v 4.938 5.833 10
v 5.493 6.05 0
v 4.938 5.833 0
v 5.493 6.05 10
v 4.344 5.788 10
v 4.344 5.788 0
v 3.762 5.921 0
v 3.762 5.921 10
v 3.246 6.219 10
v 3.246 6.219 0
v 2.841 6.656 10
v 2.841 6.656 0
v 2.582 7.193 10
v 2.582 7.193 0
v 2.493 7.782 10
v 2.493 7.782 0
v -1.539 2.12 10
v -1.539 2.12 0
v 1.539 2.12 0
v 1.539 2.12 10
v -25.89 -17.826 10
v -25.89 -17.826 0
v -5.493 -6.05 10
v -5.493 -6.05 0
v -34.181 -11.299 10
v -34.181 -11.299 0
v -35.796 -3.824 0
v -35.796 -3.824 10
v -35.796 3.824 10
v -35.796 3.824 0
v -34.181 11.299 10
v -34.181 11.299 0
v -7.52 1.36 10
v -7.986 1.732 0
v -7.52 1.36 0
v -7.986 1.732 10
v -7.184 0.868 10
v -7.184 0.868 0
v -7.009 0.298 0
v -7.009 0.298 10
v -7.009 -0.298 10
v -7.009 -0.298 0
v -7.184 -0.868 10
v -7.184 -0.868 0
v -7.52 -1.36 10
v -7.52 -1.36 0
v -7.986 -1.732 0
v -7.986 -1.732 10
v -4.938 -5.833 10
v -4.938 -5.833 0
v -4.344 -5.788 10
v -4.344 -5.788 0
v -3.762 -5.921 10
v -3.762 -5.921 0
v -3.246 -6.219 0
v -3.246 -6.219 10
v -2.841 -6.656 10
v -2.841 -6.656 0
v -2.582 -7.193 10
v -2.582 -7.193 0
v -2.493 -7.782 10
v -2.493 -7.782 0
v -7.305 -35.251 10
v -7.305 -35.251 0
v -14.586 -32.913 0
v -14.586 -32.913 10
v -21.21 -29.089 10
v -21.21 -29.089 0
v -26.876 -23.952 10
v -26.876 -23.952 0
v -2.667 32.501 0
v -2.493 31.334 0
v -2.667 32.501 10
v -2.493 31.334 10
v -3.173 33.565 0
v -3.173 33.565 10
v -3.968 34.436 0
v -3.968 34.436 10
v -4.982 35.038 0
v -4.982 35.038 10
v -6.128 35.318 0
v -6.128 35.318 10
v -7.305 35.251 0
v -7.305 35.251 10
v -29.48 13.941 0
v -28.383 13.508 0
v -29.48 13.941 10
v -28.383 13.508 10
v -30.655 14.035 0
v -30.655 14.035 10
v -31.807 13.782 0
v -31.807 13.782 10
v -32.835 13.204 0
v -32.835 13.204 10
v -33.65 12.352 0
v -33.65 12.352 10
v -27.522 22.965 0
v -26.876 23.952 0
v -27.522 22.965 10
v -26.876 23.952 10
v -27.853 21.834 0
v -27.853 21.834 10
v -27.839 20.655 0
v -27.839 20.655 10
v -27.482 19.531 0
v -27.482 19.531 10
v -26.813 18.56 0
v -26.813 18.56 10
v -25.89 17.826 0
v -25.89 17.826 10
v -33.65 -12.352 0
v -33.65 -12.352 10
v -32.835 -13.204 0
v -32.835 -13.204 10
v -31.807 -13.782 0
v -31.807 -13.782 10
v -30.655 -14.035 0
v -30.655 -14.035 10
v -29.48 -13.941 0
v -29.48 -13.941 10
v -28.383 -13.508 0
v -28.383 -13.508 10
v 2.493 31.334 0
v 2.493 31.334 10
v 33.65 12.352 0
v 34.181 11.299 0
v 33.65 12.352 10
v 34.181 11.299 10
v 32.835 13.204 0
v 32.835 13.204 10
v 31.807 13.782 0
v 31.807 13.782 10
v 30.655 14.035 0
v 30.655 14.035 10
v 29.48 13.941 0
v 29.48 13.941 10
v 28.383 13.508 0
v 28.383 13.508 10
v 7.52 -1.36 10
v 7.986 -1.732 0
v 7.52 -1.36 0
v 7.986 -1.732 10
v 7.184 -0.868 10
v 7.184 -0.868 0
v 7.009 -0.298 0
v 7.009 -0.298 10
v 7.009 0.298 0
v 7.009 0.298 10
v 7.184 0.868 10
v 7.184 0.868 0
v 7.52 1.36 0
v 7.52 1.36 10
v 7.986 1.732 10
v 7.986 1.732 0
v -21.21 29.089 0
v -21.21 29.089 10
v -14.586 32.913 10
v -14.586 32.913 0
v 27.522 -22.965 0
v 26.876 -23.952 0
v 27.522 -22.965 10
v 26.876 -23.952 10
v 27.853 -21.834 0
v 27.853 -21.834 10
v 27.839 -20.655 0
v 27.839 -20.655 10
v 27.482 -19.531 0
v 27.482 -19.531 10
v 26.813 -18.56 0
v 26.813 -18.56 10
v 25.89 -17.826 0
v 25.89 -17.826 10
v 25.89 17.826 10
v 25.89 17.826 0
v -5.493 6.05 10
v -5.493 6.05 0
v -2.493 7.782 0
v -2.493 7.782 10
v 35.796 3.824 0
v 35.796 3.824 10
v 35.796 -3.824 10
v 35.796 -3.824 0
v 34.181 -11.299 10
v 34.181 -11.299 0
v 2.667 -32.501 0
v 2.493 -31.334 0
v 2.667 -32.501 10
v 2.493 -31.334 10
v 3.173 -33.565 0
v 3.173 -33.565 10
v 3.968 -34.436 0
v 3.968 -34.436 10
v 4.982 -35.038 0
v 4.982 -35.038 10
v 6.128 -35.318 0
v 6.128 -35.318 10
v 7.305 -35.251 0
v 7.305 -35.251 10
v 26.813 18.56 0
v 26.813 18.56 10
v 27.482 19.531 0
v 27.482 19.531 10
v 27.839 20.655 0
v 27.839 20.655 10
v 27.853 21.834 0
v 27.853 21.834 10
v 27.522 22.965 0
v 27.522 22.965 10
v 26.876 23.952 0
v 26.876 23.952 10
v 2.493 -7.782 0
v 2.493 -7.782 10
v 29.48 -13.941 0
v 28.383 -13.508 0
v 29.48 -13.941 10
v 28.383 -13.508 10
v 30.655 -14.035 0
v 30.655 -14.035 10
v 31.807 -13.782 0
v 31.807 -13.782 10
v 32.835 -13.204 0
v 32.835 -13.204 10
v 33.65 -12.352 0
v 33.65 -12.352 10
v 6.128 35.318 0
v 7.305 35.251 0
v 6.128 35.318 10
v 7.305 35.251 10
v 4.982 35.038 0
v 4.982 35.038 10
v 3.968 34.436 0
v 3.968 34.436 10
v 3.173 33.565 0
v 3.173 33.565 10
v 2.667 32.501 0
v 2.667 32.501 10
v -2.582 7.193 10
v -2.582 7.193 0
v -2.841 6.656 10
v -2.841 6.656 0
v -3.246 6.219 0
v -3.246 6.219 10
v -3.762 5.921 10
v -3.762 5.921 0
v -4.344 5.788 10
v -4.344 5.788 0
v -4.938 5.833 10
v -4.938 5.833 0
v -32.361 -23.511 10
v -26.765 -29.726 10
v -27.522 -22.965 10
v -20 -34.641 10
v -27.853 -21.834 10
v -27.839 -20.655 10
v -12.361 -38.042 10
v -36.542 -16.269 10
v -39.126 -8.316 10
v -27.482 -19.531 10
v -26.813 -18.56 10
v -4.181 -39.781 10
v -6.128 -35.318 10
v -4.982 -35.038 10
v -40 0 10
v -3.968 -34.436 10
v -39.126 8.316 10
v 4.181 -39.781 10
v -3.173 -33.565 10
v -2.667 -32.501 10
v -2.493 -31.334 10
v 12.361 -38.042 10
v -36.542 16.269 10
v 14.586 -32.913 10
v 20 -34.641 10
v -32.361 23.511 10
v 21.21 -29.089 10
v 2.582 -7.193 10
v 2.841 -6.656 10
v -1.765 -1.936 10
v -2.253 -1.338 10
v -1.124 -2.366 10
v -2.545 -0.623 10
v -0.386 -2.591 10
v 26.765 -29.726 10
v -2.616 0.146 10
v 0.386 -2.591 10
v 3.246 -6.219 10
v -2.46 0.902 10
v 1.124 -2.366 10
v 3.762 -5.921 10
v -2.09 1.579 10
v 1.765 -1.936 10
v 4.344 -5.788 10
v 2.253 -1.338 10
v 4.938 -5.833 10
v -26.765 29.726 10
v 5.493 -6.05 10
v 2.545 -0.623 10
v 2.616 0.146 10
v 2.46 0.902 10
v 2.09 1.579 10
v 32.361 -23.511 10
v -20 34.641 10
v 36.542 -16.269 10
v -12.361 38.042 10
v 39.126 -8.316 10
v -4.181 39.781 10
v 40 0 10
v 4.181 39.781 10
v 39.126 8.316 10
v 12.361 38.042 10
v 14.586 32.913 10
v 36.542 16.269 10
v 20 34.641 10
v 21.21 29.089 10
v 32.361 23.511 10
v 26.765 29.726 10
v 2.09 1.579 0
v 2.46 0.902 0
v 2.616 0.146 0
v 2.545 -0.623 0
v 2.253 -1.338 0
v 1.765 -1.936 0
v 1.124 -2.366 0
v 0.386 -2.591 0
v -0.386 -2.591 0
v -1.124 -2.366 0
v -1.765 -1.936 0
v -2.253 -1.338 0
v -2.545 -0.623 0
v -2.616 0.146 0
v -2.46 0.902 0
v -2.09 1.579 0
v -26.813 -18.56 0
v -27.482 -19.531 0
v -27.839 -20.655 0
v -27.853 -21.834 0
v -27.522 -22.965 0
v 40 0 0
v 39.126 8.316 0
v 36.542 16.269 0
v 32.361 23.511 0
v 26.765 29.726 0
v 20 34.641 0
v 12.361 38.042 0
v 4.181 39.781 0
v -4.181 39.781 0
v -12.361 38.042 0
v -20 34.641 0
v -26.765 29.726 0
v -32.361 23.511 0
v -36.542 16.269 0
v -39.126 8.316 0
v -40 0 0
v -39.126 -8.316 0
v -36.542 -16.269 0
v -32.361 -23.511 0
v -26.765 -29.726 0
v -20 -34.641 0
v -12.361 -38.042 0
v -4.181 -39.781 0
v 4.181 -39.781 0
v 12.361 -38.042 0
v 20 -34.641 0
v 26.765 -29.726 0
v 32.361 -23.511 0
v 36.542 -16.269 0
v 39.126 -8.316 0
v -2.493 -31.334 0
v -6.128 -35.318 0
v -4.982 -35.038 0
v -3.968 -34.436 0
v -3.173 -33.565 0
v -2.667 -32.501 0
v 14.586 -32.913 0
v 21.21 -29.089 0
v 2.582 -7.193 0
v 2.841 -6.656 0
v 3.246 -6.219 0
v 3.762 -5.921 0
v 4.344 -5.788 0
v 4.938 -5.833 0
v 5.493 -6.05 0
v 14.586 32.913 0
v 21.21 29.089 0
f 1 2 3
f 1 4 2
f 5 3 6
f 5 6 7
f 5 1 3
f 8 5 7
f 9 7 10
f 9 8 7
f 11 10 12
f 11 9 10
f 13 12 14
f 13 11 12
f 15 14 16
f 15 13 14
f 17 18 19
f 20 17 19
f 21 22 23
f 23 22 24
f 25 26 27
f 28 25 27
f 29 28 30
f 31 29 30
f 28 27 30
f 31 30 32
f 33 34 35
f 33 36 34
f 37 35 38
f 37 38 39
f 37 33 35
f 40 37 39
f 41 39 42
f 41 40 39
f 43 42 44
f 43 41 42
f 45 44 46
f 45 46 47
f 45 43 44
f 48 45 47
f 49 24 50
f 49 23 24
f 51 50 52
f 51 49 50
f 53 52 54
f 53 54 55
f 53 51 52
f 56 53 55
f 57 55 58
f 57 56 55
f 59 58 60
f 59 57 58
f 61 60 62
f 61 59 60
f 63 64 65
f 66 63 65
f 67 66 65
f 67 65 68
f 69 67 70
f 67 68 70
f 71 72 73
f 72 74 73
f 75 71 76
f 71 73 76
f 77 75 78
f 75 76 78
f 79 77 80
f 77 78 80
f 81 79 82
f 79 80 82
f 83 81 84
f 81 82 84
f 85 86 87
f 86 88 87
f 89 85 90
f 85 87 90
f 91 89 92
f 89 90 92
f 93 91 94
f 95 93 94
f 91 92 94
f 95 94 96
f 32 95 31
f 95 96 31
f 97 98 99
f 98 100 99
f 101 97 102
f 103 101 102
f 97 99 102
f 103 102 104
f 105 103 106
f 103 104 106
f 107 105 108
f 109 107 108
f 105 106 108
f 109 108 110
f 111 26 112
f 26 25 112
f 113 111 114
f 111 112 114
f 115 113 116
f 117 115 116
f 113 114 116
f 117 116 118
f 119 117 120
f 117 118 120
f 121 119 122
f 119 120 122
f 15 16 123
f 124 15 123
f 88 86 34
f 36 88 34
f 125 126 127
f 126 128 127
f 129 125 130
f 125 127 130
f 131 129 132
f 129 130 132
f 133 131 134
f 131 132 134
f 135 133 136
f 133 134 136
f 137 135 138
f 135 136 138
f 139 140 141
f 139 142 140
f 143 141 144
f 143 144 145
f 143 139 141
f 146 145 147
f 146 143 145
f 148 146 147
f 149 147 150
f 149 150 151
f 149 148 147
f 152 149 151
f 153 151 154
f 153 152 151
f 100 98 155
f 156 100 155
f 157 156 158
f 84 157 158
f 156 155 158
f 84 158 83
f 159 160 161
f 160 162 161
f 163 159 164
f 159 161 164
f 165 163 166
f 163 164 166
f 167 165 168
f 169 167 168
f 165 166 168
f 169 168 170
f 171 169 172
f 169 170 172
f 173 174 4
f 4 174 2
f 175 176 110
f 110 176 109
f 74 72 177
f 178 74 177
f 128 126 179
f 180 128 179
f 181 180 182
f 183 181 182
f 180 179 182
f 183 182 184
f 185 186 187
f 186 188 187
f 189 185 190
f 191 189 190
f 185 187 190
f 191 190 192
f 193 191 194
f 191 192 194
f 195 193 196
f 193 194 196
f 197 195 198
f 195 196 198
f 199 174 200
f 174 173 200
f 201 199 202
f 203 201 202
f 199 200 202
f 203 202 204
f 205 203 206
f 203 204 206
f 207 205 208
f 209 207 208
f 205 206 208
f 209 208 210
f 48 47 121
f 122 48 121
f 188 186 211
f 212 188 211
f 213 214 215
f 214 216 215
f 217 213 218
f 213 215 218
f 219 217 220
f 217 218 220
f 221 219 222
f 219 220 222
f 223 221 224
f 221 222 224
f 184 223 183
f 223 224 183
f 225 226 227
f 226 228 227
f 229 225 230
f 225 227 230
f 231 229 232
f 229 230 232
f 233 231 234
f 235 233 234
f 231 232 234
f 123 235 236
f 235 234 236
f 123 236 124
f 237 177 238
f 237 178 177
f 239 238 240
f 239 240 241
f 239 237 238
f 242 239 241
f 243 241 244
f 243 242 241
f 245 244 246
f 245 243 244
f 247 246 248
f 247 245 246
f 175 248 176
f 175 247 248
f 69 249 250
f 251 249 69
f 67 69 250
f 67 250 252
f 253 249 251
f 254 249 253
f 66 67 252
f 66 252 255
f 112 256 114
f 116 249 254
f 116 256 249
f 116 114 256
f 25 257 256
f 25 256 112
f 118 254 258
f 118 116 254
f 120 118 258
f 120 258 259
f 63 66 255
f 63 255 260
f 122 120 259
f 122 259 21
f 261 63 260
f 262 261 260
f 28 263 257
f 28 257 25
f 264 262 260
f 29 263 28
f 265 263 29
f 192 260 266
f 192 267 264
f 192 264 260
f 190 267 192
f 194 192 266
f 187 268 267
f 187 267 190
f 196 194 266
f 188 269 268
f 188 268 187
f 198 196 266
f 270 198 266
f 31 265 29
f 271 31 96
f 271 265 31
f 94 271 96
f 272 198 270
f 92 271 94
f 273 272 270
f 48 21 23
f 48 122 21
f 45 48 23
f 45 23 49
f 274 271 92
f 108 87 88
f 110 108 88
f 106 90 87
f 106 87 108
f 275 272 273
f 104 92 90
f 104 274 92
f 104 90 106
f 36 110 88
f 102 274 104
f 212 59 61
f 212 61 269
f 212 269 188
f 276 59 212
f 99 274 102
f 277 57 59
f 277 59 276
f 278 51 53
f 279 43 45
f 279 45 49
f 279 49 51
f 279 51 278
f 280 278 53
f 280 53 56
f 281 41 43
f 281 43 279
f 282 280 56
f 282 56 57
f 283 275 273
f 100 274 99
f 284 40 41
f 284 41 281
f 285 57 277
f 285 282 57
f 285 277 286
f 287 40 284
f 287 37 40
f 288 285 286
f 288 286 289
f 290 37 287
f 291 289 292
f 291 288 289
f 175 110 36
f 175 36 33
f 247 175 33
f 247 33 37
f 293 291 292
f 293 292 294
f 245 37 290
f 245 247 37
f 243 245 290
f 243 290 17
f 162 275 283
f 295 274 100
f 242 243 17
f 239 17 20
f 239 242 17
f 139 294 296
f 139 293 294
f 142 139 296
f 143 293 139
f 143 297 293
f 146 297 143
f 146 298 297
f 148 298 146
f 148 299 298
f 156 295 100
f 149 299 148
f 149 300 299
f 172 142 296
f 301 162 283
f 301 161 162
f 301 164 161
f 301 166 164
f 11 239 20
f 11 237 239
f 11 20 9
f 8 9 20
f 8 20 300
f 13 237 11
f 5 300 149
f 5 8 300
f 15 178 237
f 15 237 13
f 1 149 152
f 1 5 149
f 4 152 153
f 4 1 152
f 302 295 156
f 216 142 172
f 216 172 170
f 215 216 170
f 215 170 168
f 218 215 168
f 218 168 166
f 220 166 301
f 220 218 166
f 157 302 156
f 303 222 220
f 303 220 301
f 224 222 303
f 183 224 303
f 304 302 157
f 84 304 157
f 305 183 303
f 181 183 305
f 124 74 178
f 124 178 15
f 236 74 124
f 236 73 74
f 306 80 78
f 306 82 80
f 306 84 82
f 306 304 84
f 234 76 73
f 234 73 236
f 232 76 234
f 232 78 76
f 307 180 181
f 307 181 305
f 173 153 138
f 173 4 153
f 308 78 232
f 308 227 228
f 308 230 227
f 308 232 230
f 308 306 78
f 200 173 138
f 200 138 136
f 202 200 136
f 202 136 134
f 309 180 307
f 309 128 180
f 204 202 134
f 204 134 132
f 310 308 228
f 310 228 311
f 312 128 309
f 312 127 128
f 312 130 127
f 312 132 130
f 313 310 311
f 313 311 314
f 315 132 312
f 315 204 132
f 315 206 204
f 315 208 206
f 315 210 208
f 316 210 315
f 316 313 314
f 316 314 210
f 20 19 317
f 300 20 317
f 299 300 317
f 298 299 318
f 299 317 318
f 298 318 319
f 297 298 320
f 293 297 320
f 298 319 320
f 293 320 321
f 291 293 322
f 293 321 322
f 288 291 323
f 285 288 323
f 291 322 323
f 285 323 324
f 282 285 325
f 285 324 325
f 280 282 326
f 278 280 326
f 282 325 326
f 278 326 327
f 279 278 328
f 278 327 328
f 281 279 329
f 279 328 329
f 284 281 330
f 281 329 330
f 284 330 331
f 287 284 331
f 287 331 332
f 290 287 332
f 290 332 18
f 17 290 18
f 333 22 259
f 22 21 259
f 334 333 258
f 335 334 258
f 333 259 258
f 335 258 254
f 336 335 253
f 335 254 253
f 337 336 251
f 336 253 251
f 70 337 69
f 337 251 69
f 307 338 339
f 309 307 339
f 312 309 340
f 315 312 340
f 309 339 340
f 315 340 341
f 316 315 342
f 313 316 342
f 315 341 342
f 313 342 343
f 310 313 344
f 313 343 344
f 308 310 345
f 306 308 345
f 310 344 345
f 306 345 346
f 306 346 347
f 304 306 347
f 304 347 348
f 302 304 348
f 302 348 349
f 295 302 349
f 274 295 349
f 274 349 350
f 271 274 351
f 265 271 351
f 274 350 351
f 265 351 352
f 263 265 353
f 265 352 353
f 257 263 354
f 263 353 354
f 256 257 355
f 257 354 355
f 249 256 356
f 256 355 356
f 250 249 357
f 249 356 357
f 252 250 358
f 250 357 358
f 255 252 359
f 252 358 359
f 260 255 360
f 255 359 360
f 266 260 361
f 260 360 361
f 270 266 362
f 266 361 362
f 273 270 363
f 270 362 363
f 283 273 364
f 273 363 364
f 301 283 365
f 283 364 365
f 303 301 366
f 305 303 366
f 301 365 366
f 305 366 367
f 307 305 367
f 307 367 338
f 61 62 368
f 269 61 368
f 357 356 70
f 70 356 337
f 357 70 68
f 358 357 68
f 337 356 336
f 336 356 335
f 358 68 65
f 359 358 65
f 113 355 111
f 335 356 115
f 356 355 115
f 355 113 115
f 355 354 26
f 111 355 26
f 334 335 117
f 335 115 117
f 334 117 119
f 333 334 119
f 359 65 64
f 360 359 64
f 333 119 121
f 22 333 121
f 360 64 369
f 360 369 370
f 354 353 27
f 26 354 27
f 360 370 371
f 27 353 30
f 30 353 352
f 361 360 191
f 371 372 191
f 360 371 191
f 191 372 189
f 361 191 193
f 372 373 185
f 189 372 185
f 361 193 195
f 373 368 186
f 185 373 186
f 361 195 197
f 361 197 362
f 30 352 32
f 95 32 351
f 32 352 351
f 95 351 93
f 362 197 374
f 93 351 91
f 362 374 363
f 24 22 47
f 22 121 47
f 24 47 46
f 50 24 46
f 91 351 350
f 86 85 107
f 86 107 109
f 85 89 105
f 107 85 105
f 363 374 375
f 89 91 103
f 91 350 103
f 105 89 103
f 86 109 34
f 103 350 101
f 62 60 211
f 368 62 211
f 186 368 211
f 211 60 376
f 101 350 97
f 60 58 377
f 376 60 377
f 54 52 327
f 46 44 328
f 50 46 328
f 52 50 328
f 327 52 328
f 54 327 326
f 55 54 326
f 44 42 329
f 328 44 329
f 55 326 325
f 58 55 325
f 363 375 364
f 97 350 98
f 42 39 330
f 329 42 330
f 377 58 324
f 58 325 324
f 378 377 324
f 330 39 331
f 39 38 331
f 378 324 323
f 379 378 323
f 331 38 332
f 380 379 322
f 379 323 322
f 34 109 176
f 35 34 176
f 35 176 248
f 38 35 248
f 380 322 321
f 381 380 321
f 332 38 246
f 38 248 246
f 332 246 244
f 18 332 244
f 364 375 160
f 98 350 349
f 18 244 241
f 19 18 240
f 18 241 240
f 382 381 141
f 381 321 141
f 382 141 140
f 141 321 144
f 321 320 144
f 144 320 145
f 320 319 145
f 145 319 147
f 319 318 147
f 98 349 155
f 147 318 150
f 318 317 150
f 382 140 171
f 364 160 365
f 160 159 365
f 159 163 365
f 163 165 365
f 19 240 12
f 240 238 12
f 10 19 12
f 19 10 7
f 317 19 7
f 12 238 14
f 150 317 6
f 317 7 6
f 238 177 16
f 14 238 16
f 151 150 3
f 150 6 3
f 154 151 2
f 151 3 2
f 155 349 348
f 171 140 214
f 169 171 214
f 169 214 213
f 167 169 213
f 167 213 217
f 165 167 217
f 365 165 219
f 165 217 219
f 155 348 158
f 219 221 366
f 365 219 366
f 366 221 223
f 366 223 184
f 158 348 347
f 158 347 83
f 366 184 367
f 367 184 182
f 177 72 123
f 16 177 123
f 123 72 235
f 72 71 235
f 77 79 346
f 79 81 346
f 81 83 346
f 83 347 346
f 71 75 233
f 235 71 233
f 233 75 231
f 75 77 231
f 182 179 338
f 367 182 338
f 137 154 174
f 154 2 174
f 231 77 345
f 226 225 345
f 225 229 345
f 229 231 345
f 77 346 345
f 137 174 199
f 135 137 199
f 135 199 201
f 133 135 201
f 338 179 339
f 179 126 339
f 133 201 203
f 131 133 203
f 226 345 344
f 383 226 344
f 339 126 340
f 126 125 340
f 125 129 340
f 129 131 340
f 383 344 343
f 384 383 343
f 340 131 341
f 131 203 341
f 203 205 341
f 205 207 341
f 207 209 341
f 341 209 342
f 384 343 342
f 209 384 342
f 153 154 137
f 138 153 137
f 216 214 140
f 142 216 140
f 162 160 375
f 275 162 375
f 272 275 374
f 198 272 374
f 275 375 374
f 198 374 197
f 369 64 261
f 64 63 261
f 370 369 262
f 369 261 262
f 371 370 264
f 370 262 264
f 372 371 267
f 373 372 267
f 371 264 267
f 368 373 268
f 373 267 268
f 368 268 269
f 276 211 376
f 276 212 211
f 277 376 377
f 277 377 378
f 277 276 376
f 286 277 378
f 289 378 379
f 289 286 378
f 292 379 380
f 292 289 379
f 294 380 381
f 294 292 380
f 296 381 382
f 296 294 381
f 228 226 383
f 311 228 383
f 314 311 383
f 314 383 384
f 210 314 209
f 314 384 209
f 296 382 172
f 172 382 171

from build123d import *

# Parameters (mm, degrees)
SKETCH1_R           = 40
BOSS_EXTRUDE1_DEPTH = 10
FILLET2_R           = 2
FILLET3_R           = 4


with BuildPart() as part:
    # Sketch1 → Boss-Extrude1 (new body)
    with BuildSketch(Plane.XY):
        Circle(SKETCH1_R)
        with BuildLine():
            Line((-2.4931518, -4.318265588), (-2.4931518, -35.9135656))
            ThreePointArc((-2.4931518, -35.9135656), (-18, -31.176914536), (-29.85548425, -20.115915594))
            Line((-29.85548425, -20.115915594), (-2.4931518, -4.318265588))
        make_face(mode=Mode.SUBTRACT)
        with BuildLine():
            Line((-4.9863036, 0), (-32.34863605, -15.797650006))
            ThreePointArc((-32.34863605, -15.797650006), (-36, 0), (-32.34863605, 15.797650006))
            Line((-32.34863605, 15.797650006), (-4.9863036, 0))
        make_face(mode=Mode.SUBTRACT)
        with BuildLine():
            Line((-2.4931518, 4.318265588), (-29.85548425, 20.115915594))
            ThreePointArc((-29.85548425, 20.115915594), (-18, 31.176914536), (-2.4931518, 35.9135656))
            Line((-2.4931518, 35.9135656), (-2.4931518, 4.318265588))
        make_face(mode=Mode.SUBTRACT)
        with BuildLine():
            Line((2.4931518, 4.318265588), (2.4931518, 35.9135656))
            ThreePointArc((2.4931518, 35.9135656), (18, 31.176914536), (29.85548425, 20.115915594))
            Line((29.85548425, 20.115915594), (2.4931518, 4.318265588))
        make_face(mode=Mode.SUBTRACT)
        with BuildLine():
            Line((4.9863036, 0), (32.34863605, 15.797650006))
            ThreePointArc((32.34863605, 15.797650006), (36, 0), (32.34863605, -15.797650006))
            Line((32.34863605, -15.797650006), (4.9863036, 0))
        make_face(mode=Mode.SUBTRACT)
        with BuildLine():
            Line((2.4931518, -4.318265588), (29.85548425, -20.115915594))
            ThreePointArc((29.85548425, -20.115915594), (18, -31.176914536), (2.4931518, -35.9135656))
            Line((2.4931518, -35.9135656), (2.4931518, -4.318265588))
        make_face(mode=Mode.SUBTRACT)
        with BuildLine():
            ThreePointArc((1.539480432, 2.12), (0, -2.62), (-1.539480432, 2.12))
            Line((-1.539480432, 2.12), (1.539480432, 2.12))
        make_face(mode=Mode.SUBTRACT)
    extrude(amount=BOSS_EXTRUDE1_DEPTH)

    # Fillet2
    fillet2_edges = [part.edges().sort_by_distance(p)[0] for p in [
        (4.9863036, 0, 5),
        (2.4931518, -4.318265588, 5),
        (-2.4931518, -4.318265588, 5),
        (-4.9863036, 0, 5),
        (-2.4931518, 4.318265588, 5),
        (2.4931518, 4.318265588, 5),
    ]]
    fillet(fillet2_edges, radius=FILLET2_R)

    # Fillet3
    fillet3_edges = [part.edges().sort_by_distance(p)[0] for p in [
        (32.34863605, 15.797650006, 5),
        (32.34863605, -15.797650006, 5),
        (29.85548425, -20.115915594, 5),
        (2.4931518, -35.9135656, 5),
        (-2.4931518, -35.9135656, 5),
        (-29.85548425, -20.115915594, 5),
        (-32.34863605, -15.797650006, 5),
        (-32.34863605, 15.797650006, 5),
        (-29.85548425, 20.115915594, 5),
        (-2.4931518, 35.9135656, 5),
        (2.4931518, 35.9135656, 5),
        (29.85548425, 20.115915594, 5),
    ]]
    fillet(fillet3_edges, radius=FILLET3_R)


solid = part.part
